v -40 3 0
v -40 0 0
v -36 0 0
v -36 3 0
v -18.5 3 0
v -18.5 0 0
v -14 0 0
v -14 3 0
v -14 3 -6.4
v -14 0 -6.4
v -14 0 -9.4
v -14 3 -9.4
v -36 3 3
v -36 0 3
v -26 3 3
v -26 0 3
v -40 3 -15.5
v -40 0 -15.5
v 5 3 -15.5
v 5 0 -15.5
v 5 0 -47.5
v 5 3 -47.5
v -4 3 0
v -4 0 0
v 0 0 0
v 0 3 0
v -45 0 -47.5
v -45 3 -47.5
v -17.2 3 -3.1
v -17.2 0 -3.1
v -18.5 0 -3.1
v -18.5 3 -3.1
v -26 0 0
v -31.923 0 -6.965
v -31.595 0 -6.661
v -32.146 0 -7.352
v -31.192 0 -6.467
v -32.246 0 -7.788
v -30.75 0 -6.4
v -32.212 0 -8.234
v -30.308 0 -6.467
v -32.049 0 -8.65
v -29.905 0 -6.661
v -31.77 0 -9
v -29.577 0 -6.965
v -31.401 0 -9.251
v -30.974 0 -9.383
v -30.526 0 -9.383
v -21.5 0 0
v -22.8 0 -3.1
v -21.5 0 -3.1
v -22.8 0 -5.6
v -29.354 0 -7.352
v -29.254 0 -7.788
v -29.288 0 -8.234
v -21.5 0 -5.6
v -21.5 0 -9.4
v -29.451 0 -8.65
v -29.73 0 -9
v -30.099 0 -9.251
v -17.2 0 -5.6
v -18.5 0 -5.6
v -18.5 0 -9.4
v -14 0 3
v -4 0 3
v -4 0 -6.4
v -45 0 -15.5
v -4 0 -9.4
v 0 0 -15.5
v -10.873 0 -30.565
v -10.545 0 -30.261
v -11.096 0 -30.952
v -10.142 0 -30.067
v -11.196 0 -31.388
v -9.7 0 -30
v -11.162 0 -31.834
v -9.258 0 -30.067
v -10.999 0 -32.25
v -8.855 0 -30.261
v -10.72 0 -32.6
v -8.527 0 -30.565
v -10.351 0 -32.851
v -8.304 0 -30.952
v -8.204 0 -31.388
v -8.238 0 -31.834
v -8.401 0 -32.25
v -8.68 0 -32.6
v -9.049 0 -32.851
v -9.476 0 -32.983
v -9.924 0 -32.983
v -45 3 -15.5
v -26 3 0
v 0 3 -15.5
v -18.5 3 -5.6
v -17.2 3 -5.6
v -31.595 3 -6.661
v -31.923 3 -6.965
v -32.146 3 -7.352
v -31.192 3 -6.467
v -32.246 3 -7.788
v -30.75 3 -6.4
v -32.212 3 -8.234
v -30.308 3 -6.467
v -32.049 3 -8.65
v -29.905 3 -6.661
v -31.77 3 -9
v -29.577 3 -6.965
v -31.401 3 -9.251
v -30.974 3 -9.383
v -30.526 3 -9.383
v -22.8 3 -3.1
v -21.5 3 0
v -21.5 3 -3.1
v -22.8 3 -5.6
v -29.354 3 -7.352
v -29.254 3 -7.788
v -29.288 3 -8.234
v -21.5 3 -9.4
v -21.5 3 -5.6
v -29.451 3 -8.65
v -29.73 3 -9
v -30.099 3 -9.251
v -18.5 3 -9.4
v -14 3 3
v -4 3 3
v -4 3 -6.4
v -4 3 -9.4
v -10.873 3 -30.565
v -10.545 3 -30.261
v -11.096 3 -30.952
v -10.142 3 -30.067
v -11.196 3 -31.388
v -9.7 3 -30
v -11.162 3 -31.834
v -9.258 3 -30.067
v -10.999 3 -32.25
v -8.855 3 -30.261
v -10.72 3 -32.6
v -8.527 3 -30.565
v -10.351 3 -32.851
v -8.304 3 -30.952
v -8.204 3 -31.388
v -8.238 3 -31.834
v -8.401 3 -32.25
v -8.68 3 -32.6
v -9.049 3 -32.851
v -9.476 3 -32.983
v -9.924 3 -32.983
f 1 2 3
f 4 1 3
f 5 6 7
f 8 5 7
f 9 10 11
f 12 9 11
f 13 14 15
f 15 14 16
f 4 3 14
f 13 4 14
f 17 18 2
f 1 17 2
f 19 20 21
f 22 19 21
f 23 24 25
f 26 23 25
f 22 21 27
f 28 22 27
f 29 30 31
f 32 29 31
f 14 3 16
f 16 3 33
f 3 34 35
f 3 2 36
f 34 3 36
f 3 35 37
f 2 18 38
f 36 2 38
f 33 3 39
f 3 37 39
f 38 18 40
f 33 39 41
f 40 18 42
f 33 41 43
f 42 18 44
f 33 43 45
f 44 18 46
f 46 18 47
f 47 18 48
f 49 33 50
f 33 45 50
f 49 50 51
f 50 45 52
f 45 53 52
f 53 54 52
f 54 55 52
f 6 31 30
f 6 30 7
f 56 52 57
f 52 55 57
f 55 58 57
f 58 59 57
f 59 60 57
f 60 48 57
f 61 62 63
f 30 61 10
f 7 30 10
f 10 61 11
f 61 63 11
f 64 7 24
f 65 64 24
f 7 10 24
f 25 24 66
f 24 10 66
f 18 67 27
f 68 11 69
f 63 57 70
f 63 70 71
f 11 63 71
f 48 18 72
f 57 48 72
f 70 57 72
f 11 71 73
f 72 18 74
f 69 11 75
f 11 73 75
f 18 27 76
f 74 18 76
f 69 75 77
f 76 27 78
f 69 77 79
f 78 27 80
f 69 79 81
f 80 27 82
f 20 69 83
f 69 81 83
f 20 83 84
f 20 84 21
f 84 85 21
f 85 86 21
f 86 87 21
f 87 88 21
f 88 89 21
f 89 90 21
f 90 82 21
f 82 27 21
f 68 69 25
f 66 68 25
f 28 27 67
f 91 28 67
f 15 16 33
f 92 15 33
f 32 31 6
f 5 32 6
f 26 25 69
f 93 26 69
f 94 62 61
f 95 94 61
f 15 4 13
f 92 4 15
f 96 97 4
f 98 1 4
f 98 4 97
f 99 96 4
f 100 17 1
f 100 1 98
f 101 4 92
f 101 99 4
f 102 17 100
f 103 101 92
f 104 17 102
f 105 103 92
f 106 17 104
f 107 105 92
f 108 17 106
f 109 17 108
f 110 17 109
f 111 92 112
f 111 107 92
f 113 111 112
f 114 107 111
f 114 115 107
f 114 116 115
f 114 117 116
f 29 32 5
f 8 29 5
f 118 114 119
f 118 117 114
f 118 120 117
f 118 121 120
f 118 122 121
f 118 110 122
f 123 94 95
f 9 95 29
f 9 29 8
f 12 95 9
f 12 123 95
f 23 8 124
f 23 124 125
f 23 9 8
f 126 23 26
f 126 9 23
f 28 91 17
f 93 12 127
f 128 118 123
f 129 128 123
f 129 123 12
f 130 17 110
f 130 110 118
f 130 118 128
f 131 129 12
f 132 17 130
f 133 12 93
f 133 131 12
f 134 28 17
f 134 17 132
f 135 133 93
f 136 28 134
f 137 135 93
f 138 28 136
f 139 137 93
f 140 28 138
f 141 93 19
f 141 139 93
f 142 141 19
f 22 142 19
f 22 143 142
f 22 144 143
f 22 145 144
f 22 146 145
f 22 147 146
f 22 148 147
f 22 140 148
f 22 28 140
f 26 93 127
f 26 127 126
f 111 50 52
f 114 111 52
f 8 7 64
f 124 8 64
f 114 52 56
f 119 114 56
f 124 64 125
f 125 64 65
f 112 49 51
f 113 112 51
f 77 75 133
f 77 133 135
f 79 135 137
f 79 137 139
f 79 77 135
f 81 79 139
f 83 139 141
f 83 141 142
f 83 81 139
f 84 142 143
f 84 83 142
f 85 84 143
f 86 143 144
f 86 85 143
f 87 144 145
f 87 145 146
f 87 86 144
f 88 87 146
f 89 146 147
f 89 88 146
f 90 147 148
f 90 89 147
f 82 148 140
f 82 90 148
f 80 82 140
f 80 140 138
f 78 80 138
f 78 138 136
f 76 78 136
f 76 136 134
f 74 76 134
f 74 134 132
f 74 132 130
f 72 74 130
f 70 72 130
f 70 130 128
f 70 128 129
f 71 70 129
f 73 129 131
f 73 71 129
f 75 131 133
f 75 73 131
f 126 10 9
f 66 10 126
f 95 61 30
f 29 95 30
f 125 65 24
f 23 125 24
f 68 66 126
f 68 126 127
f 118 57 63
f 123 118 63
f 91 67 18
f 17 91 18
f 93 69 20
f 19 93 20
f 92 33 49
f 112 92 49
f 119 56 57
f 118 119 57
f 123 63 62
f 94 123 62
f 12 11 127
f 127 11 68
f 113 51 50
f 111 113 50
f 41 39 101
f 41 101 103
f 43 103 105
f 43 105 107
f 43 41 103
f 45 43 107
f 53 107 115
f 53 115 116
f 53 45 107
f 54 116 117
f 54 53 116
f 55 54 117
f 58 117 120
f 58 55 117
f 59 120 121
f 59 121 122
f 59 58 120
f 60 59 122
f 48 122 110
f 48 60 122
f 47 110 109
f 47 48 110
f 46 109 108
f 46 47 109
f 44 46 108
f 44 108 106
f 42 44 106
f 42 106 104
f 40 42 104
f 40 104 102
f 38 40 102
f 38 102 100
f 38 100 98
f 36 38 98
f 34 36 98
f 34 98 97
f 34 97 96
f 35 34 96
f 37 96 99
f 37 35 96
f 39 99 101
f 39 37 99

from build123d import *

# Parameters (mm, degrees)
SKETCH2_R           = 1.5
SKETCH2_W           = 10
SKETCH2_H           = 3
BOSS_EXTRUDE1_DEPTH = 3


with BuildPart() as part:
    # Sketch2 → Boss-Extrude1 (new body)
    with BuildSketch(Plane(origin=(0, 0, 0), x_dir=(1, 0, 0), z_dir=(0, 1, 0))):
        Polygon((0, 15.5), (5, 15.5), (5, 47.5), (-45, 47.5), (-45, 15.5), (-40, 15.5), (-40, 0), (-36, 0), (-36, -3), (-26, -3), (-26, 0), (-21.5, 0), (-21.5, 3.1), (-22.8, 3.1), (-22.8, 5.6), (-21.5, 5.6), (-21.5, 9.4), (-18.5, 9.4), (-18.5, 5.6), (-17.2, 5.6), (-17.2, 3.1), (-18.5, 3.1), (-18.5, 0), (-14, 0), (-14, -3), (-4, -3), (-4, 0), (0, 0), align=None)
        with Locations(Location((-30.75, 7.9, 0), (0, 0, 270))):
            Circle(SKETCH2_R, mode=Mode.SUBTRACT)
        with Locations(Location((-9.7, 31.5, 0), (0, 0, 270))):
            Circle(SKETCH2_R, mode=Mode.SUBTRACT)
        with Locations((-9, 7.9)):
            Rectangle(SKETCH2_W, SKETCH2_H, mode=Mode.SUBTRACT)
    extrude(amount=BOSS_EXTRUDE1_DEPTH)


solid = part.part
